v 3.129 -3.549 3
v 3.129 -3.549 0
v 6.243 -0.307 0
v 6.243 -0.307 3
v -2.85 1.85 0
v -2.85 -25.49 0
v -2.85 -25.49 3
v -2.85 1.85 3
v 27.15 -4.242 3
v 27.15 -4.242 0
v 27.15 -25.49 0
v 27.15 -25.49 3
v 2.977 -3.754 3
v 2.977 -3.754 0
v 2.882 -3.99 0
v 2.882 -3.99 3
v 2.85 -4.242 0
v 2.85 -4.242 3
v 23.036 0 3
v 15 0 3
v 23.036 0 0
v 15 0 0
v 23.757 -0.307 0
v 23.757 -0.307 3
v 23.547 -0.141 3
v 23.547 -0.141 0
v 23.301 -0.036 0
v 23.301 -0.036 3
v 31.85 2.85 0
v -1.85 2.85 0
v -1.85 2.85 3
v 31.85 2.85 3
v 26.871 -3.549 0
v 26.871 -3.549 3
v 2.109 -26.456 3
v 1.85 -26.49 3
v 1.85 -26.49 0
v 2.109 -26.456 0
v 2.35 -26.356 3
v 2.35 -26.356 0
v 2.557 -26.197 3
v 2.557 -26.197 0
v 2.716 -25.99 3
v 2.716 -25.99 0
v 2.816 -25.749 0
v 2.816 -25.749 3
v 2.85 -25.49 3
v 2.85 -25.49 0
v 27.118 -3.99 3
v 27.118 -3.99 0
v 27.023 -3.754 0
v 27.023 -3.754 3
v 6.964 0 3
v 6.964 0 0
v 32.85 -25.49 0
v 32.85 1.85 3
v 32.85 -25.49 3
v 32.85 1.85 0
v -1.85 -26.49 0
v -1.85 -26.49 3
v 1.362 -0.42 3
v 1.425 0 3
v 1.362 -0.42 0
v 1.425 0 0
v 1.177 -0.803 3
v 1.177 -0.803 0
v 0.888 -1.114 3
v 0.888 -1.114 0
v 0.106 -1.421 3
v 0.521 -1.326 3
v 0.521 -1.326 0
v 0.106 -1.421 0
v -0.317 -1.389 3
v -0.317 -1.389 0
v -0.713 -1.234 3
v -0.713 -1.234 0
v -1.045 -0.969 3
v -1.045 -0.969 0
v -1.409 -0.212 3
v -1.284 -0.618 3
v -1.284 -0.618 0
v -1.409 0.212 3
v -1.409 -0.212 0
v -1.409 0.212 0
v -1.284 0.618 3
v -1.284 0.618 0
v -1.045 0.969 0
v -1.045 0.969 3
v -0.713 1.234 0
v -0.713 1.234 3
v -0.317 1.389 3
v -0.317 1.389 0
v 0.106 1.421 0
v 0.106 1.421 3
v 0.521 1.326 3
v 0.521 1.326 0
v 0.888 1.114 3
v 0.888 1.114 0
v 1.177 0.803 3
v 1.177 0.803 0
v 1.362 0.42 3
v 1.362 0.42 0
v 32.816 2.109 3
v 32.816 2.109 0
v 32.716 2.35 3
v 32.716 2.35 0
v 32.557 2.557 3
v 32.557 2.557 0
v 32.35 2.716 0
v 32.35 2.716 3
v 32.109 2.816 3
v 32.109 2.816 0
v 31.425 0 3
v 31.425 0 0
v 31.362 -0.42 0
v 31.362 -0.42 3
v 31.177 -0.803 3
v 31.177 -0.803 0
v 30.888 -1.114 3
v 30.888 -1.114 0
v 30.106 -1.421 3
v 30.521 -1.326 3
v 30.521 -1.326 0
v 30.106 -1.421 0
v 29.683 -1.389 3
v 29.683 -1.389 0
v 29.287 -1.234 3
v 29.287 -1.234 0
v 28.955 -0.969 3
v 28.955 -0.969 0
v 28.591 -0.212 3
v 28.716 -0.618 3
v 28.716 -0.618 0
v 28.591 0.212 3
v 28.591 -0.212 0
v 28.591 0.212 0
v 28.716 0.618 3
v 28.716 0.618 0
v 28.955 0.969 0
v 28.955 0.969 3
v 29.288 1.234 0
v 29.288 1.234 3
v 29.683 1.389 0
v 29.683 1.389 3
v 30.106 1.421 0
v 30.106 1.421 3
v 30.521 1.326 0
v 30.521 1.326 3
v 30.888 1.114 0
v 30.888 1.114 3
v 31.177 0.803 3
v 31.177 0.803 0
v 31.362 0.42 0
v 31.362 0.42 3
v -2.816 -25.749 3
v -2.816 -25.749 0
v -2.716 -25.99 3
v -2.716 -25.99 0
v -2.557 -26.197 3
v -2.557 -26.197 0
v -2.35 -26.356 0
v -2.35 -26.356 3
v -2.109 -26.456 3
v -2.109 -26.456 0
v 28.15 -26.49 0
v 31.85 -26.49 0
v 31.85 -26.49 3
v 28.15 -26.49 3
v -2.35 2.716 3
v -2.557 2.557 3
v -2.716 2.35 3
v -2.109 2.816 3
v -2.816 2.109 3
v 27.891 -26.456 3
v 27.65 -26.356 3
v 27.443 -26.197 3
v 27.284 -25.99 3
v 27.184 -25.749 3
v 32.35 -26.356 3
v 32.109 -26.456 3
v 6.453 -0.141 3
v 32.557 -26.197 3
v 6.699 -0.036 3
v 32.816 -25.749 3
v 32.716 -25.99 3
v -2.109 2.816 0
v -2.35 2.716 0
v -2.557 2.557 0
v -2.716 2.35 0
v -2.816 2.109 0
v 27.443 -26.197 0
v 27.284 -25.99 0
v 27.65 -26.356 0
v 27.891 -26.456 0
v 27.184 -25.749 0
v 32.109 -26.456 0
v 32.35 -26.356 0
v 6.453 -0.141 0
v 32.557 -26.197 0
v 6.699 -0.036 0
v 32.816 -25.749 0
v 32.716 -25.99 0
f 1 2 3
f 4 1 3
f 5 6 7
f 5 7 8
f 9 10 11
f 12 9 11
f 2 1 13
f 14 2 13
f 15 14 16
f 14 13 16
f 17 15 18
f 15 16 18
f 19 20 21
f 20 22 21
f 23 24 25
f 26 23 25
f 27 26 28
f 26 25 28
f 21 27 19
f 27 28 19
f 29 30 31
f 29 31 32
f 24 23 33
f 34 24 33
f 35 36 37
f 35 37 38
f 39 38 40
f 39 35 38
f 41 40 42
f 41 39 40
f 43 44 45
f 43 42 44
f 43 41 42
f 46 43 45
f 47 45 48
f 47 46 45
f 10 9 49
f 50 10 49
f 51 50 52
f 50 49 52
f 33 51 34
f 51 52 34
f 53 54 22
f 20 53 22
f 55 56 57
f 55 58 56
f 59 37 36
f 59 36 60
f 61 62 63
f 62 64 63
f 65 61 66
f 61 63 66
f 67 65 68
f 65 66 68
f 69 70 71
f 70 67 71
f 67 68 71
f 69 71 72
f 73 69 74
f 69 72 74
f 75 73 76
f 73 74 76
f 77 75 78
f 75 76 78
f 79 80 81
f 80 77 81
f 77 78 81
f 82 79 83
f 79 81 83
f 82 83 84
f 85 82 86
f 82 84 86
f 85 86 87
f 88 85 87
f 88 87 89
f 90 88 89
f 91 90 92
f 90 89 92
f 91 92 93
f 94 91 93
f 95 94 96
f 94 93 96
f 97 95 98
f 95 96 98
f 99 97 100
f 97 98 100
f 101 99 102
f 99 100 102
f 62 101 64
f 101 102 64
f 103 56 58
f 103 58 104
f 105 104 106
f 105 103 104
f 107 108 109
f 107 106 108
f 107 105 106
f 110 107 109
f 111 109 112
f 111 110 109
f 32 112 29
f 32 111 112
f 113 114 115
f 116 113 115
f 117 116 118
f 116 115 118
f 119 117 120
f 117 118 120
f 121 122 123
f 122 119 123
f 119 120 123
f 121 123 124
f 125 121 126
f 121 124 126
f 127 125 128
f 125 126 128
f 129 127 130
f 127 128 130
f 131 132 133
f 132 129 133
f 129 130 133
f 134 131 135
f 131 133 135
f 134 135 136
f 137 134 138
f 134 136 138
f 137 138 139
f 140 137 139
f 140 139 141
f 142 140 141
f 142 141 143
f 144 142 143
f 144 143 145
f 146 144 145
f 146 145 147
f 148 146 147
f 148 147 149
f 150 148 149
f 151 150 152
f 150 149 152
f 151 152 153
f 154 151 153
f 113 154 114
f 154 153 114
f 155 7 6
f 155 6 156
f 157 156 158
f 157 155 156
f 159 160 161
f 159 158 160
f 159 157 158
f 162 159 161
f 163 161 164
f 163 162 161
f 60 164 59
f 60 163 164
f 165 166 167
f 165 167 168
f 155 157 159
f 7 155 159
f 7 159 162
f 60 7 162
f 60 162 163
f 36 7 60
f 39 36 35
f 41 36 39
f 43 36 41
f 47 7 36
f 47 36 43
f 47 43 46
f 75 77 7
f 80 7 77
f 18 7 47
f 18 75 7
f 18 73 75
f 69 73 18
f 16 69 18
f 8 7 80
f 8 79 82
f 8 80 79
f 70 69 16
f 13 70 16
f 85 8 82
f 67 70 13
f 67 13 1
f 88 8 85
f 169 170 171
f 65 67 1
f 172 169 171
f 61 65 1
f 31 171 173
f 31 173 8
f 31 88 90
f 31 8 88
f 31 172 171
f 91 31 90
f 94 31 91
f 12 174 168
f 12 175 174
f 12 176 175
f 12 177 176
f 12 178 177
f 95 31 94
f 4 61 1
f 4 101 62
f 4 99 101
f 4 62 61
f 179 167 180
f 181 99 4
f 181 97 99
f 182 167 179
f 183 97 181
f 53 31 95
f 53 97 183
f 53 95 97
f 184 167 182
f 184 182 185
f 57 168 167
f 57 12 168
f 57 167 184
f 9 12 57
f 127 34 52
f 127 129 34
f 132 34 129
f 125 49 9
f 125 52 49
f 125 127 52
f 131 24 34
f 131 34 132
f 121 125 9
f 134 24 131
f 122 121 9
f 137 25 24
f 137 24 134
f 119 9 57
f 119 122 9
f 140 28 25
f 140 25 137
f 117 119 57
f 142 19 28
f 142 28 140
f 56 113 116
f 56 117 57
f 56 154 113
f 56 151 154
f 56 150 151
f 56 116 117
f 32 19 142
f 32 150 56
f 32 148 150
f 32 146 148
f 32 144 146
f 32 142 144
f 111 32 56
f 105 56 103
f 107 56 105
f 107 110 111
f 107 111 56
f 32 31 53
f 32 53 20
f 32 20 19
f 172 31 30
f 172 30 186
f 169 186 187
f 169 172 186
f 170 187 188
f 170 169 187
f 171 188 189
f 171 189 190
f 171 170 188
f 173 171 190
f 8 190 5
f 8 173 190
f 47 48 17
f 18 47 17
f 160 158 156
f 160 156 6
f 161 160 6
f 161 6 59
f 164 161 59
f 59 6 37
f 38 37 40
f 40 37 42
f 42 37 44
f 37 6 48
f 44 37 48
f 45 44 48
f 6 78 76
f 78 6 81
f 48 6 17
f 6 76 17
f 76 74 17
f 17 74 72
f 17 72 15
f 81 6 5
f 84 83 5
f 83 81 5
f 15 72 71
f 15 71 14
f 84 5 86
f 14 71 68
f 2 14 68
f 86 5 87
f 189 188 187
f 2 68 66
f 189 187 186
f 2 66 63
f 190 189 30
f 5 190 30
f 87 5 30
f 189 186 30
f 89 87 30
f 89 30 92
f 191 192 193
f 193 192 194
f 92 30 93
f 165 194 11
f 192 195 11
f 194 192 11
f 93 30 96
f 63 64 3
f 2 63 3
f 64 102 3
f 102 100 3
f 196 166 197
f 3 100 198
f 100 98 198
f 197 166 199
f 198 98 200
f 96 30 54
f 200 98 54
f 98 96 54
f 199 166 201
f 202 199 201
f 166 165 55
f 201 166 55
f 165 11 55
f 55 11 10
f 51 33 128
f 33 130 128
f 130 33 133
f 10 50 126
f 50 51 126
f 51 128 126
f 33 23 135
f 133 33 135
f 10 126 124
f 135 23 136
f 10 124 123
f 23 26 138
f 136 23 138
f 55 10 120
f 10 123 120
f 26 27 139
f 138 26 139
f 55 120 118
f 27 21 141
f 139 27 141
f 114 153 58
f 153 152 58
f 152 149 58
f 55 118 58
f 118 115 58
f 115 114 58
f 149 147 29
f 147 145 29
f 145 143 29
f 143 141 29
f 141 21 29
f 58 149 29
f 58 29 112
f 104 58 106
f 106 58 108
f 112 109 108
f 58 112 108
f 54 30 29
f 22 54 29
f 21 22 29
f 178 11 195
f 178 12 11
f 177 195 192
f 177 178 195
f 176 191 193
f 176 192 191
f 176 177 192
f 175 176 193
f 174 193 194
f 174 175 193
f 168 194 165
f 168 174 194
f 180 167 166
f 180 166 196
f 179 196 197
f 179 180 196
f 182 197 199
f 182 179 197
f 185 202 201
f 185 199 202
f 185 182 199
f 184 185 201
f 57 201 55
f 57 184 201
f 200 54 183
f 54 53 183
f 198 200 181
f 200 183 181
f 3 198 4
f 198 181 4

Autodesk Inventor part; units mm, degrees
ref_plane "YZ Plane" through (0, 0, 0) normal (1, 0, 0) x (0, 1, 0)
ref_plane "XZ Plane" through (0, 0, 0) normal (0, 1, 0) x (-1, 0, 0)
ref_plane "XY Plane" through (0, 0, 0) normal (0, 0, 1) x (1, 0, 0)
sketch "Sketch1" plane through (0, 0, 0) normal (0, 0, 1) x (1, 0, 0)
  circle A0 centre (0, 0) radius 1.425
  circle A1 centre (30, 0) radius 1.425
  line L0 (0, 0) -> (30, 0) construction
  line L1 (15, 0) -> (15, -17.6441)
  line L2 (-2.85, 2.85) -> (32.85, 2.85)
  line L3 (32.85, 2.85) -> (32.85, -26.4898)
  line L4 (-2.85, -26.4898) -> (-2.85, 2.85)
  line L5 (2.85, -26.4898) -> (2.85, -3.8397)
  line L6 (2.85, -3.8397) -> (6.5383, 0)
  line L7 (6.5383, 0) -> (23.4617, 0)
  line L8 (23.4617, 0) -> (27.15, -3.8397)
  line L9 (27.15, -3.8397) -> (27.15, -26.4898)
  line L10 (32.85, -26.4898) -> (27.15, -26.4898)
  line L11 (2.85, -26.4898) -> (-2.85, -26.4898)
  dimension "d0" = 2.85
  dimension "d1" = 30
  dimension "d2" = 2.85
  dimension "d3" = 2.85
  dimension "d4" = 2.85
extrude "Extrusion1" add sketch "Sketch1" along normal blind 3
fillet "Fillet1" radius 1 10 edges at (-2.85, 2.85, 1.5) (32.85, 2.85, 1.5) (-2.85, -26.4898, 1.5) (2.85, -26.4898, 1.5) (32.85, -26.4898, 1.5) (27.15, -26.4898, 1.5) (2.85, -3.8397, 1.5) (6.5383, 0, 1.5) (23.4617, 0, 1.5) (27.15, -3.8397, 1.5)
properties part number "ExtraBoardSpacer"
